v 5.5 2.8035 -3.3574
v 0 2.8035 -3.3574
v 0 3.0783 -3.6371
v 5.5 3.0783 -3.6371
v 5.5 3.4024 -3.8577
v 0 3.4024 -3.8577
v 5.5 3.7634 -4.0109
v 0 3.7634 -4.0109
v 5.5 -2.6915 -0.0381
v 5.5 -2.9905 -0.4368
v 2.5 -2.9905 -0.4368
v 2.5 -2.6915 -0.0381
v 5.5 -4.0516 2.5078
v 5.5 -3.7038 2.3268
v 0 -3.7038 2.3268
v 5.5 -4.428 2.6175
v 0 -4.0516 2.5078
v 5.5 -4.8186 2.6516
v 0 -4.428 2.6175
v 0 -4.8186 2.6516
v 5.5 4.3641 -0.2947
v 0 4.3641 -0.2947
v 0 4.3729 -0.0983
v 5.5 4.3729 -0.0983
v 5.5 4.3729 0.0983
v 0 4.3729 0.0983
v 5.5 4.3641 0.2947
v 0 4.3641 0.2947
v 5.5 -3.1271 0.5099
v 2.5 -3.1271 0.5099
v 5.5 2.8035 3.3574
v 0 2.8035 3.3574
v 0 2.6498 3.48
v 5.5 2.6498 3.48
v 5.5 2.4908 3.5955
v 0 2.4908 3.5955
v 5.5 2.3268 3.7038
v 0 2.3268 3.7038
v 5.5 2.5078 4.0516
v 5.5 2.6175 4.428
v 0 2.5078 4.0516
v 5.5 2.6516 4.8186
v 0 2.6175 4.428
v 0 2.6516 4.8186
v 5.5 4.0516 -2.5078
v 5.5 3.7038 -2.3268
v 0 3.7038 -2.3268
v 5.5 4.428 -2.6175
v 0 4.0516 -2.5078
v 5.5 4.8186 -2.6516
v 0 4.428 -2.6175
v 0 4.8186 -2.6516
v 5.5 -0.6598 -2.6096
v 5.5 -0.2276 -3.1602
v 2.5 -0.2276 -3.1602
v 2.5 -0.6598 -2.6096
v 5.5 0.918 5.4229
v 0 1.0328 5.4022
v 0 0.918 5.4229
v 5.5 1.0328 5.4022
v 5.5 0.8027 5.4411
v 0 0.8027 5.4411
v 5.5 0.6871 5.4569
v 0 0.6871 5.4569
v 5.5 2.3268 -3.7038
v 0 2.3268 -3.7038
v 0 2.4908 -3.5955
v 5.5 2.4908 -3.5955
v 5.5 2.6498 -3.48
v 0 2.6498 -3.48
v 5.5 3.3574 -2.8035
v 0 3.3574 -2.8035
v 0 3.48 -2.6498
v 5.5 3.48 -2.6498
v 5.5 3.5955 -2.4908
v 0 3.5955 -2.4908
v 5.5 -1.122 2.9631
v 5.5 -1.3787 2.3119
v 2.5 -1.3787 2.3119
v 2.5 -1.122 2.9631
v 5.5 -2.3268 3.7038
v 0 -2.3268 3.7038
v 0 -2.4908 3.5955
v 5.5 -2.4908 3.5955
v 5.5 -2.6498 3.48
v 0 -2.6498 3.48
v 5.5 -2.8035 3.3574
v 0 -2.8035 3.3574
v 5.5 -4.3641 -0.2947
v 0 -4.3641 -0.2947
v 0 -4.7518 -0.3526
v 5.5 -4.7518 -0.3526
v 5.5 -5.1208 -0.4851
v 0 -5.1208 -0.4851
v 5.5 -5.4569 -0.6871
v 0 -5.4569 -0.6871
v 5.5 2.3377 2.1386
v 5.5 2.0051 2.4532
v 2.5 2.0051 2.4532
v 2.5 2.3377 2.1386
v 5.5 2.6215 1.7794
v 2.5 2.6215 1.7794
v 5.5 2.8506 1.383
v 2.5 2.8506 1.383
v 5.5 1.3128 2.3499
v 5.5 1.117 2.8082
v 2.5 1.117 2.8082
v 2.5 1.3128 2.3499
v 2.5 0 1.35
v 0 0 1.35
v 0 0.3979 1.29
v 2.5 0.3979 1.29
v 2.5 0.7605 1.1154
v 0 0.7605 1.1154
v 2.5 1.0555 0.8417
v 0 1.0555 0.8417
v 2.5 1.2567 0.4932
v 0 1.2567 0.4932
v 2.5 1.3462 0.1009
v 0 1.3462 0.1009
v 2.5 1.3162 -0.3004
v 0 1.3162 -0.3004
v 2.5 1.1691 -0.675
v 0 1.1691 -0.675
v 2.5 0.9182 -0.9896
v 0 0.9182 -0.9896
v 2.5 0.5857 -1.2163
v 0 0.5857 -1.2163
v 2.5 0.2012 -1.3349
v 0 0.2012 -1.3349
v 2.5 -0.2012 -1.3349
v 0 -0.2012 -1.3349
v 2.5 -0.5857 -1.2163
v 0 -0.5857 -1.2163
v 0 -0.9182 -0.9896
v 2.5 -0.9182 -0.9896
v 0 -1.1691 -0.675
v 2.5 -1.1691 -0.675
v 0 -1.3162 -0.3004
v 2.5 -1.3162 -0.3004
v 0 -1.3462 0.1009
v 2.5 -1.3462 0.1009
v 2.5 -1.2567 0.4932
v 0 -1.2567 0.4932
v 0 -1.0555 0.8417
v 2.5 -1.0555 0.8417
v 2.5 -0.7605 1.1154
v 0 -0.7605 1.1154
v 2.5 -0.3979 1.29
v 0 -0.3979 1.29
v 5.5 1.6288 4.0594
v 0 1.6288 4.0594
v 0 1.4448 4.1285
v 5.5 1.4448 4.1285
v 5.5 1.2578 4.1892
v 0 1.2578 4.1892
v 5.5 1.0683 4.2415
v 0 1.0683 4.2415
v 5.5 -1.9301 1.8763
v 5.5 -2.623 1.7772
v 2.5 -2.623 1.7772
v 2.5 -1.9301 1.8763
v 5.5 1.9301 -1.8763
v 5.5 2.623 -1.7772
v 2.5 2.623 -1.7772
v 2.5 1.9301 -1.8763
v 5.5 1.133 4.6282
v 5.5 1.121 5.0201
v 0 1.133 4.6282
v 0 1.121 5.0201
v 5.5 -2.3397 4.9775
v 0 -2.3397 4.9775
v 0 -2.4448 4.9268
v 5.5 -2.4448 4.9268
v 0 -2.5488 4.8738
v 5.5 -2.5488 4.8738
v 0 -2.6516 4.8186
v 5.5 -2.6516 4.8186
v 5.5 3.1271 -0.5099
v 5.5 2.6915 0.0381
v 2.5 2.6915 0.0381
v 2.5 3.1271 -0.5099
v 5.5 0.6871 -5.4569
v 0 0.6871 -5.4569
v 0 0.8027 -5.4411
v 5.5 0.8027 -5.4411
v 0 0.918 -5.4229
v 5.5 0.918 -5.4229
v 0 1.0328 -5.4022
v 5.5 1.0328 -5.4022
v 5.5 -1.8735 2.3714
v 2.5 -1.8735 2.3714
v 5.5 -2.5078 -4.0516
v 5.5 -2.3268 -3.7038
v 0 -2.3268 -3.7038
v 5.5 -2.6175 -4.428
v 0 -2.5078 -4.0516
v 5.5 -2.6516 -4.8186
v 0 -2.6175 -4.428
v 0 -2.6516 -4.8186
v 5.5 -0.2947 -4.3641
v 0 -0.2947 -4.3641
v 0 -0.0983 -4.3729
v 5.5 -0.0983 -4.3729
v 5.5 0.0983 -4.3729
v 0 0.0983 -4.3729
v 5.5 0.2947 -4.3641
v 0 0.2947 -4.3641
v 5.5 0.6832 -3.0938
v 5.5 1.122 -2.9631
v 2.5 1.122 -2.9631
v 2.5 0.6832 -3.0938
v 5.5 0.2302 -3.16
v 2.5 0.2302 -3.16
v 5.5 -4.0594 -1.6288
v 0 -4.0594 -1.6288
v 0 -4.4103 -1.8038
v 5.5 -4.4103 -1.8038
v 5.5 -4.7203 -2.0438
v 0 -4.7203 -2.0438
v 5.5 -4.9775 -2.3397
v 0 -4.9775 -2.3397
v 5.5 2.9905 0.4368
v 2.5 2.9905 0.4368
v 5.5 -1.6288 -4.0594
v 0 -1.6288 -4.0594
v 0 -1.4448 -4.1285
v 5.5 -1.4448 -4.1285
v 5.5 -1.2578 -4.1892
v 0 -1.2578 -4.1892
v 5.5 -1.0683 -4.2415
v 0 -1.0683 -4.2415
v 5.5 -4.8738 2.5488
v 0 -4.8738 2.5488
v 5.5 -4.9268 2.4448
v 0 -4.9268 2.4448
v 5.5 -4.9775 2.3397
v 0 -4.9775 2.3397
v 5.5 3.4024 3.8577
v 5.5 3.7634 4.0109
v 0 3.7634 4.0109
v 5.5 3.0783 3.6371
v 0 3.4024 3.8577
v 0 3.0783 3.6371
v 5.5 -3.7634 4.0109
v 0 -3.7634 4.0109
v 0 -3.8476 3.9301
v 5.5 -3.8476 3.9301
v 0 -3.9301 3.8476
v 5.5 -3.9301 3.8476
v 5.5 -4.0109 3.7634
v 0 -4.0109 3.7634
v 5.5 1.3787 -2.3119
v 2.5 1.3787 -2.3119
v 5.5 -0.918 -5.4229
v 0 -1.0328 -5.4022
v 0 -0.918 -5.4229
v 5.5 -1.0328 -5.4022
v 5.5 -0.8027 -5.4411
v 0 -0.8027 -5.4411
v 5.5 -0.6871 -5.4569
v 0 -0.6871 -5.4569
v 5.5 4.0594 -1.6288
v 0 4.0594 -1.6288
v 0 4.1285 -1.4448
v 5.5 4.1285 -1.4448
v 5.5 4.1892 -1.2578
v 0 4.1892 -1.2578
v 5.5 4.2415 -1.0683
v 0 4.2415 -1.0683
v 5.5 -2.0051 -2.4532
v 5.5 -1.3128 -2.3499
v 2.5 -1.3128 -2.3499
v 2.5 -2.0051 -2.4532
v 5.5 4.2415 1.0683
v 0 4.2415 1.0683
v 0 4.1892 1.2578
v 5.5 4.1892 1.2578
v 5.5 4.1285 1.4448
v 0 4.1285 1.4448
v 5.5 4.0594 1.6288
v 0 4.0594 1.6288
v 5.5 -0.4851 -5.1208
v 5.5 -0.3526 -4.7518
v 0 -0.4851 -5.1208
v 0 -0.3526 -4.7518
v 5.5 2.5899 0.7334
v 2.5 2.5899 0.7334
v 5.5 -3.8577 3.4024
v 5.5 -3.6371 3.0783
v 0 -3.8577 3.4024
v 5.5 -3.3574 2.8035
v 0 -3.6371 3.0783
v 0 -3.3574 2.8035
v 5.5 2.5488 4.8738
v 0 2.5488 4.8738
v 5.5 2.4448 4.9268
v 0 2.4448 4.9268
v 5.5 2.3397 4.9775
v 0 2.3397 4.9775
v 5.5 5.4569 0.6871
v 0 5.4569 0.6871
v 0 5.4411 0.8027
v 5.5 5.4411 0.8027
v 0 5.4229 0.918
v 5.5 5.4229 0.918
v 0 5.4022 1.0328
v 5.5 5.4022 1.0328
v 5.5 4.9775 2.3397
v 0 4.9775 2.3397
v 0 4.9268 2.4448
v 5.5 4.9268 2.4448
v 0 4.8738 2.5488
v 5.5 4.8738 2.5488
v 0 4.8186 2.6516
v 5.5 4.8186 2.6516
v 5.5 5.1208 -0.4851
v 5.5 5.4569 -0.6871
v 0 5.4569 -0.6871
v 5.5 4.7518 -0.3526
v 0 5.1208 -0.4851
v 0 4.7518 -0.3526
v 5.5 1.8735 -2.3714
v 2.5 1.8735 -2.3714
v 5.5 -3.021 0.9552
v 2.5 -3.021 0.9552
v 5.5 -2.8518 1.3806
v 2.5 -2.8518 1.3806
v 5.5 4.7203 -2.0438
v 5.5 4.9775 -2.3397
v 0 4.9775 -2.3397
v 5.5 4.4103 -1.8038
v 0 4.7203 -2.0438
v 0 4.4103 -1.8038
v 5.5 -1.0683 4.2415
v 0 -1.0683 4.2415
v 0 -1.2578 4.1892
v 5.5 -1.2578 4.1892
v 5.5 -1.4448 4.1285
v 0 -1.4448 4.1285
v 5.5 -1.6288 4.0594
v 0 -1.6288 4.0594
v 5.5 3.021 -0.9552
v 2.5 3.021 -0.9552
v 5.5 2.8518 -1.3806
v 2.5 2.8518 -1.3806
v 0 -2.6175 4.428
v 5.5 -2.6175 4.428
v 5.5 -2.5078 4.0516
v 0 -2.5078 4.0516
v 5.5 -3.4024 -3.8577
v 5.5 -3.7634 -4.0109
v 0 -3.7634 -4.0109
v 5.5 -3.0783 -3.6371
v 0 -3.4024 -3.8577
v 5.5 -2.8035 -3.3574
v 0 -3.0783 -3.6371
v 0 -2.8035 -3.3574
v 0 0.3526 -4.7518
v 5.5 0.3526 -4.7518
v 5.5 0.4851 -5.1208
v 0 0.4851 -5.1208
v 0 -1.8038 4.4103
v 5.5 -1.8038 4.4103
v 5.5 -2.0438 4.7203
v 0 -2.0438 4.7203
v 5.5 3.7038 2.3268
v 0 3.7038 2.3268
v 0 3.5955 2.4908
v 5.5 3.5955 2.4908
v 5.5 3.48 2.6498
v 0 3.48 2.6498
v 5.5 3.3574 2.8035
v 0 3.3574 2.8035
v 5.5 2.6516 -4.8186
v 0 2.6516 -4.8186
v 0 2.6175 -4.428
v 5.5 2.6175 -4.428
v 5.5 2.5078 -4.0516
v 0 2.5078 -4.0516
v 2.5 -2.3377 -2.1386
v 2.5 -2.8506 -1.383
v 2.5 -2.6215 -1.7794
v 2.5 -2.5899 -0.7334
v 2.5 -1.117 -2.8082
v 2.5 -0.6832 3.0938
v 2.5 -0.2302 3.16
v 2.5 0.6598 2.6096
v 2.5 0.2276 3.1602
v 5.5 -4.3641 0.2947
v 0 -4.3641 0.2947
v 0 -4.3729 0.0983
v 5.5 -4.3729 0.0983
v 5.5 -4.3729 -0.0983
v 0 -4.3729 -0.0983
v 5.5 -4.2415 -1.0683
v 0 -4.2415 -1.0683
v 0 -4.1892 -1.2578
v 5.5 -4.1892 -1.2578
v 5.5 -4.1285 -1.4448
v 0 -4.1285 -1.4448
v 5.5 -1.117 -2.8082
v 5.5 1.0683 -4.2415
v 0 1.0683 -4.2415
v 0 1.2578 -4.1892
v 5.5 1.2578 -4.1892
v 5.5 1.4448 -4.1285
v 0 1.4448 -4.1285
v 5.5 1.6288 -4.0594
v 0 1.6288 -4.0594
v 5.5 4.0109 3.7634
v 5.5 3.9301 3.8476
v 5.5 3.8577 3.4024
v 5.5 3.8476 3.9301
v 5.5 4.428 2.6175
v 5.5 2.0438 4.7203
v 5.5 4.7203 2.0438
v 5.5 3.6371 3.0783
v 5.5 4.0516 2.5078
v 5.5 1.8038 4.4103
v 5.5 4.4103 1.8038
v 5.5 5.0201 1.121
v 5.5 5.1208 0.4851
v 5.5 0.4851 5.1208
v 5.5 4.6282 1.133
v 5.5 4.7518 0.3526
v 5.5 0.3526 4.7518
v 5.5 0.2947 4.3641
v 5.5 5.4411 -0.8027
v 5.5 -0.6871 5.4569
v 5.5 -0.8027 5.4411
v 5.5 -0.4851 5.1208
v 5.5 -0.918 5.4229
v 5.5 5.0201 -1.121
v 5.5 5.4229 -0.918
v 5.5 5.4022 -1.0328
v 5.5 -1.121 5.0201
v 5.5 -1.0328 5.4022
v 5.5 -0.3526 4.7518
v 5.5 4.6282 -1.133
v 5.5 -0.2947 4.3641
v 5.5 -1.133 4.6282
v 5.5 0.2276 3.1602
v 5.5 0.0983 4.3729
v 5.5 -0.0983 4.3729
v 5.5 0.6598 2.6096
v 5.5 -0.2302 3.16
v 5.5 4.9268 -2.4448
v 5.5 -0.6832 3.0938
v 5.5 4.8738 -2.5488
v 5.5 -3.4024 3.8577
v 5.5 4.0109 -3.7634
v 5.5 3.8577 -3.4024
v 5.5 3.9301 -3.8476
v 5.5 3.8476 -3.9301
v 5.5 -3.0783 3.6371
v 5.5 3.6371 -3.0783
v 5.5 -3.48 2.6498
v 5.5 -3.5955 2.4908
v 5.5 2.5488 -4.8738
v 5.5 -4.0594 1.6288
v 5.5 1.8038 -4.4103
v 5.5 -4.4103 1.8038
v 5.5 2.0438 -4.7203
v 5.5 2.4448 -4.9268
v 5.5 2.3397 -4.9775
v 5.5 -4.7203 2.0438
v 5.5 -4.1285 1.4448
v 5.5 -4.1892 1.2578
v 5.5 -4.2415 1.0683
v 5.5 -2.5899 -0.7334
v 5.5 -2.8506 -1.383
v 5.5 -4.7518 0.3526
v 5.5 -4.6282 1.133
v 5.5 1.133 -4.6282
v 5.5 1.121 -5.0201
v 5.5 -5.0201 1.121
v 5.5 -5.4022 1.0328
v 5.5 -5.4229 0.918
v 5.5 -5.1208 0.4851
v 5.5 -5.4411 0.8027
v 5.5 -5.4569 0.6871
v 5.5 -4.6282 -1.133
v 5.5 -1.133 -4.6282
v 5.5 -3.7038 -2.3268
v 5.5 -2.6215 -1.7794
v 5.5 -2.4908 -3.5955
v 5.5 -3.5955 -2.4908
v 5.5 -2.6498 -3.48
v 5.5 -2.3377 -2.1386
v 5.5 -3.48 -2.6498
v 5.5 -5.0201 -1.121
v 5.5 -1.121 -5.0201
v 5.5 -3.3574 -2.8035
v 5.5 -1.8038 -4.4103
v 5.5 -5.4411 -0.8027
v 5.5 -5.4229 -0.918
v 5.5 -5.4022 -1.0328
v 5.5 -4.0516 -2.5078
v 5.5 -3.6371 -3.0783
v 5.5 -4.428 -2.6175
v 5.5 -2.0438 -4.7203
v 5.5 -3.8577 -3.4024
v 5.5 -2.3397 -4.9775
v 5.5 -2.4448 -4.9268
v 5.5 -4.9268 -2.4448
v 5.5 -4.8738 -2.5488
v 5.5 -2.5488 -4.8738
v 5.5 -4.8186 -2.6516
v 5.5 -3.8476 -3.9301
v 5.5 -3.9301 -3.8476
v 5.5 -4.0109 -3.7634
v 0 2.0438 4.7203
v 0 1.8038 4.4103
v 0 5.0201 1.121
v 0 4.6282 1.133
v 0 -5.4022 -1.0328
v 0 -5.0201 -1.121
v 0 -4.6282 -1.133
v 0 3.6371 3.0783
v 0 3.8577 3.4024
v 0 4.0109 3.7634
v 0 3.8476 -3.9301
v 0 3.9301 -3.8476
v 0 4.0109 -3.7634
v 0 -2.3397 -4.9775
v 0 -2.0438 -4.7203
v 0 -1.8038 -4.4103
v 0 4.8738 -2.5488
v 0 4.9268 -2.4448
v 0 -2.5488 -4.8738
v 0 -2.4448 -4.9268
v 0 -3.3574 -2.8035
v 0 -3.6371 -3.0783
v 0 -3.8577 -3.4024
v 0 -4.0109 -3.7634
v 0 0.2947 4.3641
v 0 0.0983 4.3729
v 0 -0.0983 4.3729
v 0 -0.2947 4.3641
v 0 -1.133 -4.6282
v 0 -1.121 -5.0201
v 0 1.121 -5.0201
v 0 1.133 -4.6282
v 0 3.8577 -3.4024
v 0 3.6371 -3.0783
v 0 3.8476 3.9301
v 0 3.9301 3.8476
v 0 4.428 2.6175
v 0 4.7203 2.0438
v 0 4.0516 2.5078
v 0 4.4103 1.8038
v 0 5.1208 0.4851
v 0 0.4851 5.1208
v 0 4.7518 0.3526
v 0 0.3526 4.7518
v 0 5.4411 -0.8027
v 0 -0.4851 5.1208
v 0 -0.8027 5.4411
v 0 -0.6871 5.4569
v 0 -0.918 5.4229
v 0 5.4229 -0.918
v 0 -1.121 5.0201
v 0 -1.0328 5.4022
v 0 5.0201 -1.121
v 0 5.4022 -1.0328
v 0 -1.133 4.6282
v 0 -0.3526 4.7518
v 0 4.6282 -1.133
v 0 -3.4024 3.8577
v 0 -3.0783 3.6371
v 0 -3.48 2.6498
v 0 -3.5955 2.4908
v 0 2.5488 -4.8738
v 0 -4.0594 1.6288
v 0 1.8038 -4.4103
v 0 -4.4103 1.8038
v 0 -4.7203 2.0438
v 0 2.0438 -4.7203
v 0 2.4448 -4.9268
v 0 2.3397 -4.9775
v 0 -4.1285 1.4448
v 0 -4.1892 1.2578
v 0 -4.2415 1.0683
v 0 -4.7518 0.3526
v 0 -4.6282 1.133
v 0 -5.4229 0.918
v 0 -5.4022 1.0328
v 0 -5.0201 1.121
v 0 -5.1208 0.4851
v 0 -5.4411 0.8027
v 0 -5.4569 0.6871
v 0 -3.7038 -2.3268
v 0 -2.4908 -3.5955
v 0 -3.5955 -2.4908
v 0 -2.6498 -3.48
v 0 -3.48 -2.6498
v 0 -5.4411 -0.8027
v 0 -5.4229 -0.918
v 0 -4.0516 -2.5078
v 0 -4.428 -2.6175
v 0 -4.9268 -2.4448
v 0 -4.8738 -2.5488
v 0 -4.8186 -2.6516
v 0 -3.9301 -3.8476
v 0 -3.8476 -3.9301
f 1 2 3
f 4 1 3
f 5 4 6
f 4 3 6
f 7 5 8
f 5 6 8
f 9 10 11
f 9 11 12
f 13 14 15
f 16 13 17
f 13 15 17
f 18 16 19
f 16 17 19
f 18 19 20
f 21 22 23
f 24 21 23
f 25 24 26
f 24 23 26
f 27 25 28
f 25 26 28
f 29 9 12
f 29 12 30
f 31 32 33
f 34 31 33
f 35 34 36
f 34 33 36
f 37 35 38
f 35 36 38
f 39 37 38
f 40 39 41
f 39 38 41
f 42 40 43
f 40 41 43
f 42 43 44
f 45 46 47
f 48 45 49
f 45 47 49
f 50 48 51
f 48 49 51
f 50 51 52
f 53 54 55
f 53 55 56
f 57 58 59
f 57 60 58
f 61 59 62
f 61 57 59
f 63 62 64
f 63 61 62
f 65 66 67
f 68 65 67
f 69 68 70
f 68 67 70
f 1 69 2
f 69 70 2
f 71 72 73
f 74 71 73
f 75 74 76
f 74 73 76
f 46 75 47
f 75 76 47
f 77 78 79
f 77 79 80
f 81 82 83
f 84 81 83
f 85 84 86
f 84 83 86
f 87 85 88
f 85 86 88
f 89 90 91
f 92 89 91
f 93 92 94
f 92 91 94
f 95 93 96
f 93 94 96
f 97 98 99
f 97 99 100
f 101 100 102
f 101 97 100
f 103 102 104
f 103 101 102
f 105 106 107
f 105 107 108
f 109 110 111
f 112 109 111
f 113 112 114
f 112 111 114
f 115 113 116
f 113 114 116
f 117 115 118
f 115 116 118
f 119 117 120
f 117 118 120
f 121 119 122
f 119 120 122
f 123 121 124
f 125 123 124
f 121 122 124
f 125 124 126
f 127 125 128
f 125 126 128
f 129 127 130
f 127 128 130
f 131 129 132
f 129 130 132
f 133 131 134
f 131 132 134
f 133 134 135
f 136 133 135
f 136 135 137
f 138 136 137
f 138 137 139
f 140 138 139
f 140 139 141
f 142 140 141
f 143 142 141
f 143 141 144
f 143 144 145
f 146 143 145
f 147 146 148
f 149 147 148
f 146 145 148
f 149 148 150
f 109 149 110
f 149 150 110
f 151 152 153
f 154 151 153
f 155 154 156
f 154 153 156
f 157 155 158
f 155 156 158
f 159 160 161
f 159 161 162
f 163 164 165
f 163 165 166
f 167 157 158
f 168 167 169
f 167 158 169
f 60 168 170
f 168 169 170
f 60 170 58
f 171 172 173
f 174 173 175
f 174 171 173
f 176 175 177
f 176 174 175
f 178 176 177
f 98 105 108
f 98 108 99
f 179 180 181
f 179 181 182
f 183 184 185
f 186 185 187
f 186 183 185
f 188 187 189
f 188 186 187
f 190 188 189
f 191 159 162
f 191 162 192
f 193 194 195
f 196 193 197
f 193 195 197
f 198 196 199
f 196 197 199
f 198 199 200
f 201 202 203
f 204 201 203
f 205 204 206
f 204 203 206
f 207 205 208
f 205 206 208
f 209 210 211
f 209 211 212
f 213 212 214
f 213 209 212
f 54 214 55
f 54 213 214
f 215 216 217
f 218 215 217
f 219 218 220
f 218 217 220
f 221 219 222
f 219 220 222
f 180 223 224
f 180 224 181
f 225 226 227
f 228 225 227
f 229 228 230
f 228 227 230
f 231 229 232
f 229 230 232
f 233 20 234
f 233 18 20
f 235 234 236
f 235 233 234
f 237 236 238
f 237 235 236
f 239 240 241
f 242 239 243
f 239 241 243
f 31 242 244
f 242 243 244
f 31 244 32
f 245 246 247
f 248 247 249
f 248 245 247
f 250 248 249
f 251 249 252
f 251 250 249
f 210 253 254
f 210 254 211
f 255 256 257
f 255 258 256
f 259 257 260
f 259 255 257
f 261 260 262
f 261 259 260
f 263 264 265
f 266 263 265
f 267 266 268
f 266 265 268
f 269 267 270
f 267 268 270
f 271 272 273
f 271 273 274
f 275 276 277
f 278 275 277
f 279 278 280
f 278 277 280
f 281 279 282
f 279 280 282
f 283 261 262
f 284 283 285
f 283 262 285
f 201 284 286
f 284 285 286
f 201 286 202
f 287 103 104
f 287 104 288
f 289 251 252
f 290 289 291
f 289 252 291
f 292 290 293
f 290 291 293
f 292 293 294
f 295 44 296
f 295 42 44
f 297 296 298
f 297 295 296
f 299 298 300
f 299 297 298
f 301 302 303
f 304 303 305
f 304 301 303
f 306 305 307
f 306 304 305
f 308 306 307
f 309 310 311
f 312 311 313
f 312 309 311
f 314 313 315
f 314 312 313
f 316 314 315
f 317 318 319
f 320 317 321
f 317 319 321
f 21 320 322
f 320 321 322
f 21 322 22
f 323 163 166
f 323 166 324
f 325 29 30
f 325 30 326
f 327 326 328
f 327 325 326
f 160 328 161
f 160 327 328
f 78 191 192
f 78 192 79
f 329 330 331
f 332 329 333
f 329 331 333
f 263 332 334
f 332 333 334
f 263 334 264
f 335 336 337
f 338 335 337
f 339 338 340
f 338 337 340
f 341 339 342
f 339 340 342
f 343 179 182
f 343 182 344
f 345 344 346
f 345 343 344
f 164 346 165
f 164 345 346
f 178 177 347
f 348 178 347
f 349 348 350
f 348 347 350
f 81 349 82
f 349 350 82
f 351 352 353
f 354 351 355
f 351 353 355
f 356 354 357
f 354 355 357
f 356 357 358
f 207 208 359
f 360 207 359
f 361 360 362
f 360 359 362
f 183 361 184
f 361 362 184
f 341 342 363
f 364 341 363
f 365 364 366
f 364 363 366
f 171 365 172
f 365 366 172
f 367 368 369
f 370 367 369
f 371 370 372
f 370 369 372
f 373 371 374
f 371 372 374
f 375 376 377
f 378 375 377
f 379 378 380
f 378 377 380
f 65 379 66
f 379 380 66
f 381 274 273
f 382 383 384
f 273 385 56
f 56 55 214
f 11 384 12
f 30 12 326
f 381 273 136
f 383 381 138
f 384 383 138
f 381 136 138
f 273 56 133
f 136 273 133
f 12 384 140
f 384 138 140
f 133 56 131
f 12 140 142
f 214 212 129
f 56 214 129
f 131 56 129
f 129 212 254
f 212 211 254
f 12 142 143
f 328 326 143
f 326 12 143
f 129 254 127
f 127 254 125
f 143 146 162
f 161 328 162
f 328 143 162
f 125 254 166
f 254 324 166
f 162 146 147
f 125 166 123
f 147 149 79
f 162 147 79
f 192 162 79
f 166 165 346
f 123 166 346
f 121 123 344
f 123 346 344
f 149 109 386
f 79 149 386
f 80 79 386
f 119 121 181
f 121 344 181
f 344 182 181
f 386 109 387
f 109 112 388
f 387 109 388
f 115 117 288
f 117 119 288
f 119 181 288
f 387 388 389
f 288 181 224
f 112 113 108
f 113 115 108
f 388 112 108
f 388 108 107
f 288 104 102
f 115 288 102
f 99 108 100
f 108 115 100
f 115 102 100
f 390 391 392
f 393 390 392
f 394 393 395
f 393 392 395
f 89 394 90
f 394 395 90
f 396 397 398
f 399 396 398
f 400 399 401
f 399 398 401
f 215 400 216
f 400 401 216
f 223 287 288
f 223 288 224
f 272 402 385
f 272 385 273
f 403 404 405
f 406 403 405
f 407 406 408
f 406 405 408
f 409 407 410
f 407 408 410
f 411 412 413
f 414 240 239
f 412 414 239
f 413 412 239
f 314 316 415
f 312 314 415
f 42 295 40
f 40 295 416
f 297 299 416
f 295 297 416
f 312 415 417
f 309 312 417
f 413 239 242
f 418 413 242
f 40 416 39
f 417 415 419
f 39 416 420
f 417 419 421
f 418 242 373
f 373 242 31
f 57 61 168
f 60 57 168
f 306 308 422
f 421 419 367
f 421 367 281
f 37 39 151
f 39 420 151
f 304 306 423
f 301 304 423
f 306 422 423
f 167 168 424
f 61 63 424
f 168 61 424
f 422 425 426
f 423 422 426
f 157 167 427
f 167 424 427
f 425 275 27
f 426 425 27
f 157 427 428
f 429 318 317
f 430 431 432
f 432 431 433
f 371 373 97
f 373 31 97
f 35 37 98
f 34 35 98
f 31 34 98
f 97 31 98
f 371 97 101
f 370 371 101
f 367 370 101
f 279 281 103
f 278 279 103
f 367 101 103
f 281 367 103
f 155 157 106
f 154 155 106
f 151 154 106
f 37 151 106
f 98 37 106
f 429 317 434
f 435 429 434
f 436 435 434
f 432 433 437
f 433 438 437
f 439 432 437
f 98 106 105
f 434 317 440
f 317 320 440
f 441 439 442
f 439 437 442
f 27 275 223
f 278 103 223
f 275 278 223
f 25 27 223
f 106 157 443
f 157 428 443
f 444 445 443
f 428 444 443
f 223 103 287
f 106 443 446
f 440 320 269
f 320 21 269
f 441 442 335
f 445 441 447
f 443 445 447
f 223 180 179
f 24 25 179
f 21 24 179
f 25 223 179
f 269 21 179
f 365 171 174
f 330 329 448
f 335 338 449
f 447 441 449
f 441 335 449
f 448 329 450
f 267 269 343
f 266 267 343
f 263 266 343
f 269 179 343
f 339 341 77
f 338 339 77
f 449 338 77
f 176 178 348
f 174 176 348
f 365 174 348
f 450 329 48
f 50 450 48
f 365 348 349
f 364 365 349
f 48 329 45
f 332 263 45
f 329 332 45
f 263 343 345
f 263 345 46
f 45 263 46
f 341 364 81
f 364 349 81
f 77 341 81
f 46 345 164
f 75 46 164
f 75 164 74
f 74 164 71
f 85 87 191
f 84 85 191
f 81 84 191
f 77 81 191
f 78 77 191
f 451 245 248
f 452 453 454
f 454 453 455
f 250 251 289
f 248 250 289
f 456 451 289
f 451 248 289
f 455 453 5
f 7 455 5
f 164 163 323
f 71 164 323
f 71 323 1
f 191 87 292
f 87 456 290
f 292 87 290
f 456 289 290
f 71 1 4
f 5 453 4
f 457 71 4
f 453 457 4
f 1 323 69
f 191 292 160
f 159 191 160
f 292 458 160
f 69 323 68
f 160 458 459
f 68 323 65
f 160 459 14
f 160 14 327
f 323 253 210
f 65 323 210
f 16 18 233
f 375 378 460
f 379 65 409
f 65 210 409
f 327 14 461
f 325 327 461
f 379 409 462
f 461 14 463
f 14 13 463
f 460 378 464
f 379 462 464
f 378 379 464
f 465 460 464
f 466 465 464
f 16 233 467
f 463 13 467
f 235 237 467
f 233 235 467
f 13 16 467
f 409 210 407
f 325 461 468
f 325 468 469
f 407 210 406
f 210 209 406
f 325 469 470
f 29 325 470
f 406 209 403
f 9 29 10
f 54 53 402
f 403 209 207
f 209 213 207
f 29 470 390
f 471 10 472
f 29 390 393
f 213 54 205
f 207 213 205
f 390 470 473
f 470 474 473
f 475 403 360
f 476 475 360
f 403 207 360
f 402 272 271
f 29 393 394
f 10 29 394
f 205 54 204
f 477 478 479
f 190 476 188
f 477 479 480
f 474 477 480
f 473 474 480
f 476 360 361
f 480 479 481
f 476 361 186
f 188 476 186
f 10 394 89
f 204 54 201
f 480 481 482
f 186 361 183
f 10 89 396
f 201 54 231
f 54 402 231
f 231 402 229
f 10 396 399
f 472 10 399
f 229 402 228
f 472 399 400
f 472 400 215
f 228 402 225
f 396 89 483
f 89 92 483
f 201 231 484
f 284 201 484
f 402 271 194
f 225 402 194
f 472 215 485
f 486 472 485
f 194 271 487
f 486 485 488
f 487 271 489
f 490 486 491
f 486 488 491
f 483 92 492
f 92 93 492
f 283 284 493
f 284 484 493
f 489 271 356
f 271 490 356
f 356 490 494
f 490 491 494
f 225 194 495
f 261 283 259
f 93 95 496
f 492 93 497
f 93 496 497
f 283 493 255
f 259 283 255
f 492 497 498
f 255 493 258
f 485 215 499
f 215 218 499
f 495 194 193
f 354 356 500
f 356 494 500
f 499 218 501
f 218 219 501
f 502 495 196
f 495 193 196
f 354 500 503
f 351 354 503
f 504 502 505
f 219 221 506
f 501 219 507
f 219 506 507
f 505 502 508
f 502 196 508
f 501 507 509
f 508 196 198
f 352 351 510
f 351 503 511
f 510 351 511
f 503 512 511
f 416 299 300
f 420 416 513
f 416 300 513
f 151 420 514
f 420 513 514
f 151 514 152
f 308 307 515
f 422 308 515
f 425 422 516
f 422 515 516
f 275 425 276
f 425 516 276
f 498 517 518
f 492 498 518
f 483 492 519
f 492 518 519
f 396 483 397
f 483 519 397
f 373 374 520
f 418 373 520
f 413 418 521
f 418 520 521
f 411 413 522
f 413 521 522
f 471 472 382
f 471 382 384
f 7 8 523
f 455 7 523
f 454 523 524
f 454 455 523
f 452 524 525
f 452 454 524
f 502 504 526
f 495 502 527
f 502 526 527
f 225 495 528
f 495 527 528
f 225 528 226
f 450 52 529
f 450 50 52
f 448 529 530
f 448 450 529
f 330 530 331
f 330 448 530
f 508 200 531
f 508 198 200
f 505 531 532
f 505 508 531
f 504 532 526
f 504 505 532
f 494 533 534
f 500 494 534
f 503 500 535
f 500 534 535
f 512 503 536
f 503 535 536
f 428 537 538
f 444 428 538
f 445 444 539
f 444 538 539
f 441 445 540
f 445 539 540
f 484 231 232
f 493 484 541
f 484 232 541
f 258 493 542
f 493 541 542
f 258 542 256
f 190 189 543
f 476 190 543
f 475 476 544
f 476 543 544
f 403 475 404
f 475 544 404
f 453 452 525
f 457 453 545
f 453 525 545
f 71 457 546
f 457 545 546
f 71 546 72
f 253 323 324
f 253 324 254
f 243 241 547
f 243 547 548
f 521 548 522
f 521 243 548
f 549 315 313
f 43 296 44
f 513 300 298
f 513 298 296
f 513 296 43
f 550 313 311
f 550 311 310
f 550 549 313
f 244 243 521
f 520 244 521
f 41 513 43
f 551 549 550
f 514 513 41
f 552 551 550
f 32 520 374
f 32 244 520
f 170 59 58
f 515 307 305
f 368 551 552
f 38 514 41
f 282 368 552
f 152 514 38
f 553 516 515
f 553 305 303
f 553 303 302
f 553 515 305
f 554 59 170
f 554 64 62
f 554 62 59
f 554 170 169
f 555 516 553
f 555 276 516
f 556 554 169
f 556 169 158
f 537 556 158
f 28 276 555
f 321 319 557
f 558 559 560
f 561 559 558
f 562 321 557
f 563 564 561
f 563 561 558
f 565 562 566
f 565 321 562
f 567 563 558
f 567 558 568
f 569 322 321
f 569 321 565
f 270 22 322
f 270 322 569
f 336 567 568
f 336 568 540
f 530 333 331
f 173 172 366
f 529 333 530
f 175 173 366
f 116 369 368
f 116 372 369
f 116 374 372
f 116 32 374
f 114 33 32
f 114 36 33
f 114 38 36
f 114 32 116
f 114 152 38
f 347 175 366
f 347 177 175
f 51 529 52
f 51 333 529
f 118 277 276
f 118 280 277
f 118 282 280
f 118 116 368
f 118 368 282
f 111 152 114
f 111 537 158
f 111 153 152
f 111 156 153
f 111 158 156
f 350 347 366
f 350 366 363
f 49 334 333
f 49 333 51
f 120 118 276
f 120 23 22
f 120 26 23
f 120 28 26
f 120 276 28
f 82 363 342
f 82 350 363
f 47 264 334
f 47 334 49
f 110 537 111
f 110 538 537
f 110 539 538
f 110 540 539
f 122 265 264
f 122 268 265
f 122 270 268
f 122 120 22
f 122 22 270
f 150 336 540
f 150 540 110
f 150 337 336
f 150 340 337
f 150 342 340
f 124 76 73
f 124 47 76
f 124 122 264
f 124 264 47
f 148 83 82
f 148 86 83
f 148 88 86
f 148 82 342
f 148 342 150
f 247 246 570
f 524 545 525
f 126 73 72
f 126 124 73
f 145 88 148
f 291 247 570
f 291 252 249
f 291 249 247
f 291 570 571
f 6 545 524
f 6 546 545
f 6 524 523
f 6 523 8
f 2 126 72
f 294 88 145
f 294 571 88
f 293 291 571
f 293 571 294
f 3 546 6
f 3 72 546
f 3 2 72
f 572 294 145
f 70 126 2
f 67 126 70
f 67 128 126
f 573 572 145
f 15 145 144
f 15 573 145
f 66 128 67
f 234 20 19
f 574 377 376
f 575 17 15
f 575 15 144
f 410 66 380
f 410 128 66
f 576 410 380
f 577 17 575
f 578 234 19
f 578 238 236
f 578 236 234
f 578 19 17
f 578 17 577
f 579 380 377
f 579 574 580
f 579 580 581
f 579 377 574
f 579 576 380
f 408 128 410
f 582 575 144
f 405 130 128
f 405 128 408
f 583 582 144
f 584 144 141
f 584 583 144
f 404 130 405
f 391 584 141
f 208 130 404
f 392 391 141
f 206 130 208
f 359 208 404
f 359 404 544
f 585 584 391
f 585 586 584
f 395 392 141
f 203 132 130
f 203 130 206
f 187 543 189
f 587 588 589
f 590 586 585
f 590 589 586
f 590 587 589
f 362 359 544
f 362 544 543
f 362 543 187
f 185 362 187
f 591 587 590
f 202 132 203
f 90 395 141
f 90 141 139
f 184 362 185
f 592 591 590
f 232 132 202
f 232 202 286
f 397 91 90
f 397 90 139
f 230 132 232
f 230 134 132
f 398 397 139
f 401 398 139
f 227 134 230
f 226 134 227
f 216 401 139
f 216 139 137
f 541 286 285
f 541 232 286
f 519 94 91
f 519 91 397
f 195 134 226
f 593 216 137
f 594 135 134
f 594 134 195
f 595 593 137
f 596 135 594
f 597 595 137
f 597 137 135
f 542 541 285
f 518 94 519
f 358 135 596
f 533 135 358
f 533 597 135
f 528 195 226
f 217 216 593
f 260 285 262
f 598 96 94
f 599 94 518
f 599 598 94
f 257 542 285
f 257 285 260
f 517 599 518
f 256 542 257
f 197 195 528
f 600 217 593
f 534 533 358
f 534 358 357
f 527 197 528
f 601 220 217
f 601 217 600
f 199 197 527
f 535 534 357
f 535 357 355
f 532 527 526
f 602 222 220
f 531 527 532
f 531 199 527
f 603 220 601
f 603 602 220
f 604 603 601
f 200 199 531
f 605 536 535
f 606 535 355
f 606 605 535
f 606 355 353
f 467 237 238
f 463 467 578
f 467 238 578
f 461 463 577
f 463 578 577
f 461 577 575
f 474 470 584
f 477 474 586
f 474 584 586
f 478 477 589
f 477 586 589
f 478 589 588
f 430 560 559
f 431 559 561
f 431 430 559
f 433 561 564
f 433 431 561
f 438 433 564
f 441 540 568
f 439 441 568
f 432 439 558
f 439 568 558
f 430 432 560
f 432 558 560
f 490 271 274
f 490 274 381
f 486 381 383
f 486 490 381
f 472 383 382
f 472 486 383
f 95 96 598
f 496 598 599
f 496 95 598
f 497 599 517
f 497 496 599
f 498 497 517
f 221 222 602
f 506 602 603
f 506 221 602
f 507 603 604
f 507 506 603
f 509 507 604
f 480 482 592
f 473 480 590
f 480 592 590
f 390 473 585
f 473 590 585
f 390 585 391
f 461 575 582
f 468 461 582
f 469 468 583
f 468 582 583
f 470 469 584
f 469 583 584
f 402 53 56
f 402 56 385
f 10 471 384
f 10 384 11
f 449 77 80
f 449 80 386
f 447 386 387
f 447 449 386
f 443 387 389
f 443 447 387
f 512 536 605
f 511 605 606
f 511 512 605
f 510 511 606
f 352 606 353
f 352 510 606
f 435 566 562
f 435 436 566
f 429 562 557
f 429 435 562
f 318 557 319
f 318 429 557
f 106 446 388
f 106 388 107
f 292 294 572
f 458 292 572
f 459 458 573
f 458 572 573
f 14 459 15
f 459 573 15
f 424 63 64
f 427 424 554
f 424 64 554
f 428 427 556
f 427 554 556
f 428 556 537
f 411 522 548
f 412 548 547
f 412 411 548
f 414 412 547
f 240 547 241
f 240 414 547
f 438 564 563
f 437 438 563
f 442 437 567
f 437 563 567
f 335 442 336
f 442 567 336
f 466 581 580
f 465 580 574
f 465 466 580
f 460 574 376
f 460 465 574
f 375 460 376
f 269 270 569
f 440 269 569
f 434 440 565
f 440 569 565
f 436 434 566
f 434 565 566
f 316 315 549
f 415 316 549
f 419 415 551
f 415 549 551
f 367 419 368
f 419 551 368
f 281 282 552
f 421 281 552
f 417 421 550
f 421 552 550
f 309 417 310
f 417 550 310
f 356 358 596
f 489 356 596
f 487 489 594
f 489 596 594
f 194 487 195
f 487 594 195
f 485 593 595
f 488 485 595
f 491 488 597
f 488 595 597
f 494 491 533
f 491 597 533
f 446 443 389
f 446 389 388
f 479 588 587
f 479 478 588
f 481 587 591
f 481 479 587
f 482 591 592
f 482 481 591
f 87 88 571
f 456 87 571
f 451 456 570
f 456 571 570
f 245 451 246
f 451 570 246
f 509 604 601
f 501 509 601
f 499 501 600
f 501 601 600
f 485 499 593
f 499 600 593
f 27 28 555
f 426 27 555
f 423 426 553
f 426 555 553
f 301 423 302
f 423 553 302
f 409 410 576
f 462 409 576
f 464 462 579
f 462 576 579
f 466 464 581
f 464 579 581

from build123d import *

# Parameters (mm, degrees)
BASPROSKE_W             = 5.5
BASPROSKE_H             = 5.5
TOOTHCUT_DEPTH          = 10.526279442
TEETHCUTS_COUNT         = 20
TEETHCUTS_ANGLE         = 342
BORSKE_R                = 0.5
BORE_DEPTH              = 50.0008636
CUT_EXTRUDE1_DEPTH      = 10.476593643
CUT_EXTRUDE1_DEPTH_BACK = 10.476593643
SKETCH3_R               = 3.65
SKETCH3_R_2             = 1.35
BOSS_EXTRUDE1_DEPTH     = 2.5


with BuildPart() as part:
    # BasProSke → Base-Revolve (revolve)
    with BuildSketch(Plane(origin=(0, 0, 0), x_dir=(1, 0, 0), z_dir=(0, 1, 0)), mode=Mode.PRIVATE) as base_revolve_sk:
        with Locations((2.75, 2.75)):
            Rectangle(BASPROSKE_W, BASPROSKE_H)
    revolve(base_revolve_sk.sketch.rotate(Axis((-10, 0, 0), (1, 0, 0)), 180), axis=Axis((-10, 0, 0), (1, 0, 0)))

    # TooCutSke → ToothCut (cut, through all)
    with BuildSketch(Plane(origin=(0, 0, 0), x_dir=(0, 0, -1), z_dir=(1, 0, 0))):
        with BuildLine():
            ThreePointArc((0.29465164, 4.364064208), (0, 4.374), (-0.29465164, 4.364064208))
            ThreePointArc((-0.29465164, 4.364064208), (-0.414807829, 4.95335164), (-0.704719584, 5.480275127))
            ThreePointArc((-0.704719584, 5.480275127), (0, 5.5254), (0.704719584, 5.480275127))
            ThreePointArc((0.704719584, 5.480275127), (0.414807829, 4.95335164), (0.29465164, 4.364064208))
        make_face()
    toothcut = extrude(amount=TOOTHCUT_DEPTH, mode=Mode.SUBTRACT)

    # TeethCuts: ToothCut ×20 about axis
    teethcuts_axis = Axis((-10, 0, 0), (1, 0, 0))
    for i in range(1, TEETHCUTS_COUNT):
        add(toothcut.rotate(teethcuts_axis, i * TEETHCUTS_ANGLE / (TEETHCUTS_COUNT - 1)), mode=Mode.SUBTRACT)

    # BorSke → Bore (cut, symmetric)
    with BuildSketch(Plane(origin=(0, 0, 0), x_dir=(0, 0, -1), z_dir=(1, 0, 0))):
        with Locations(Location((0, 0, 0), (0, 0, 180))):
            Circle(BORSKE_R)
    extrude(amount=BORE_DEPTH, both=True, mode=Mode.SUBTRACT)

    # Sketch2 → Cut-Extrude1 (cut, two sides: drawn at the far end of the back side and taken through both)
    with BuildSketch(Plane.ZY.offset(-CUT_EXTRUDE1_DEPTH_BACK)):
        with BuildLine():
            Line((-1.777198988, 2.623027169), (-1.87625046, 1.9300706))
            Line((-1.87625046, 1.9300706), (-2.371433872, 1.873523785))
            Line((-2.371433872, 1.873523785), (-2.311857805, 1.378695687))
            Line((-2.311857805, 1.378695687), (-2.963084724, 1.121978916))
            ThreePointArc((-2.963084724, 1.121978916), (-3.135124987, 0.457929127), (-3.160207657, -0.227585887))
            Line((-3.160207657, -0.227585887), (-2.6096154, -0.659845262))
            Line((-2.6096154, -0.659845262), (-2.808236128, -1.116960084))
            Line((-2.808236128, -1.116960084), (-2.349914391, -1.312779746))
            Line((-2.349914391, -1.312779746), (-2.453204606, -2.005117186))
            ThreePointArc((-2.453204606, -2.005117186), (-1.964140751, -2.48613332), (-1.383008669, -2.850613056))
            Line((-1.383008669, -2.850613056), (-0.733364941, -2.589915862))
            Line((-0.733364941, -2.589915862), (-0.436802256, -2.990483869))
            Line((-0.436802256, -2.990483869), (-0.038056586, -2.691475433))
            Line((-0.038056586, -2.691475433), (0.509880118, -3.127096103))
            ThreePointArc((0.509880118, -3.127096103), (1.170984237, -2.944062446), (1.777198988, -2.623027169))
            Line((1.777198988, -2.623027169), (1.87625046, -1.9300706))
            Line((1.87625046, -1.9300706), (2.371433872, -1.873523785))
            Line((2.371433872, -1.873523785), (2.311857805, -1.378695687))
            Line((2.311857805, -1.378695687), (2.963084724, -1.121978916))
            ThreePointArc((2.963084724, -1.121978916), (3.135124987, -0.457929127), (3.160207657, 0.227585887))
            Line((3.160207657, 0.227585887), (2.6096154, 0.659845262))
            Line((2.6096154, 0.659845262), (2.808236128, 1.116960084))
            Line((2.808236128, 1.116960084), (2.349914391, 1.312779746))
            Line((2.349914391, 1.312779746), (2.453204606, 2.005117186))
            ThreePointArc((2.453204606, 2.005117186), (1.964140751, 2.48613332), (1.383008669, 2.850613056))
            Line((1.383008669, 2.850613056), (0.733364941, 2.589915862))
            Line((0.733364941, 2.589915862), (0.436802256, 2.990483869))
            Line((0.436802256, 2.990483869), (0.038056586, 2.691475433))
            Line((0.038056586, 2.691475433), (-0.509880118, 3.127096103))
            ThreePointArc((-0.509880118, 3.127096103), (-1.170984237, 2.944062446), (-1.777198988, 2.623027169))
        make_face()
    extrude(amount=CUT_EXTRUDE1_DEPTH + CUT_EXTRUDE1_DEPTH_BACK, mode=Mode.SUBTRACT)

    # Sketch3 → Boss-Extrude1 (add)
    with BuildSketch(Plane.ZY):
        Circle(SKETCH3_R)
        Circle(SKETCH3_R_2, mode=Mode.SUBTRACT)
    extrude(amount=-BOSS_EXTRUDE1_DEPTH)


solid = part.part
